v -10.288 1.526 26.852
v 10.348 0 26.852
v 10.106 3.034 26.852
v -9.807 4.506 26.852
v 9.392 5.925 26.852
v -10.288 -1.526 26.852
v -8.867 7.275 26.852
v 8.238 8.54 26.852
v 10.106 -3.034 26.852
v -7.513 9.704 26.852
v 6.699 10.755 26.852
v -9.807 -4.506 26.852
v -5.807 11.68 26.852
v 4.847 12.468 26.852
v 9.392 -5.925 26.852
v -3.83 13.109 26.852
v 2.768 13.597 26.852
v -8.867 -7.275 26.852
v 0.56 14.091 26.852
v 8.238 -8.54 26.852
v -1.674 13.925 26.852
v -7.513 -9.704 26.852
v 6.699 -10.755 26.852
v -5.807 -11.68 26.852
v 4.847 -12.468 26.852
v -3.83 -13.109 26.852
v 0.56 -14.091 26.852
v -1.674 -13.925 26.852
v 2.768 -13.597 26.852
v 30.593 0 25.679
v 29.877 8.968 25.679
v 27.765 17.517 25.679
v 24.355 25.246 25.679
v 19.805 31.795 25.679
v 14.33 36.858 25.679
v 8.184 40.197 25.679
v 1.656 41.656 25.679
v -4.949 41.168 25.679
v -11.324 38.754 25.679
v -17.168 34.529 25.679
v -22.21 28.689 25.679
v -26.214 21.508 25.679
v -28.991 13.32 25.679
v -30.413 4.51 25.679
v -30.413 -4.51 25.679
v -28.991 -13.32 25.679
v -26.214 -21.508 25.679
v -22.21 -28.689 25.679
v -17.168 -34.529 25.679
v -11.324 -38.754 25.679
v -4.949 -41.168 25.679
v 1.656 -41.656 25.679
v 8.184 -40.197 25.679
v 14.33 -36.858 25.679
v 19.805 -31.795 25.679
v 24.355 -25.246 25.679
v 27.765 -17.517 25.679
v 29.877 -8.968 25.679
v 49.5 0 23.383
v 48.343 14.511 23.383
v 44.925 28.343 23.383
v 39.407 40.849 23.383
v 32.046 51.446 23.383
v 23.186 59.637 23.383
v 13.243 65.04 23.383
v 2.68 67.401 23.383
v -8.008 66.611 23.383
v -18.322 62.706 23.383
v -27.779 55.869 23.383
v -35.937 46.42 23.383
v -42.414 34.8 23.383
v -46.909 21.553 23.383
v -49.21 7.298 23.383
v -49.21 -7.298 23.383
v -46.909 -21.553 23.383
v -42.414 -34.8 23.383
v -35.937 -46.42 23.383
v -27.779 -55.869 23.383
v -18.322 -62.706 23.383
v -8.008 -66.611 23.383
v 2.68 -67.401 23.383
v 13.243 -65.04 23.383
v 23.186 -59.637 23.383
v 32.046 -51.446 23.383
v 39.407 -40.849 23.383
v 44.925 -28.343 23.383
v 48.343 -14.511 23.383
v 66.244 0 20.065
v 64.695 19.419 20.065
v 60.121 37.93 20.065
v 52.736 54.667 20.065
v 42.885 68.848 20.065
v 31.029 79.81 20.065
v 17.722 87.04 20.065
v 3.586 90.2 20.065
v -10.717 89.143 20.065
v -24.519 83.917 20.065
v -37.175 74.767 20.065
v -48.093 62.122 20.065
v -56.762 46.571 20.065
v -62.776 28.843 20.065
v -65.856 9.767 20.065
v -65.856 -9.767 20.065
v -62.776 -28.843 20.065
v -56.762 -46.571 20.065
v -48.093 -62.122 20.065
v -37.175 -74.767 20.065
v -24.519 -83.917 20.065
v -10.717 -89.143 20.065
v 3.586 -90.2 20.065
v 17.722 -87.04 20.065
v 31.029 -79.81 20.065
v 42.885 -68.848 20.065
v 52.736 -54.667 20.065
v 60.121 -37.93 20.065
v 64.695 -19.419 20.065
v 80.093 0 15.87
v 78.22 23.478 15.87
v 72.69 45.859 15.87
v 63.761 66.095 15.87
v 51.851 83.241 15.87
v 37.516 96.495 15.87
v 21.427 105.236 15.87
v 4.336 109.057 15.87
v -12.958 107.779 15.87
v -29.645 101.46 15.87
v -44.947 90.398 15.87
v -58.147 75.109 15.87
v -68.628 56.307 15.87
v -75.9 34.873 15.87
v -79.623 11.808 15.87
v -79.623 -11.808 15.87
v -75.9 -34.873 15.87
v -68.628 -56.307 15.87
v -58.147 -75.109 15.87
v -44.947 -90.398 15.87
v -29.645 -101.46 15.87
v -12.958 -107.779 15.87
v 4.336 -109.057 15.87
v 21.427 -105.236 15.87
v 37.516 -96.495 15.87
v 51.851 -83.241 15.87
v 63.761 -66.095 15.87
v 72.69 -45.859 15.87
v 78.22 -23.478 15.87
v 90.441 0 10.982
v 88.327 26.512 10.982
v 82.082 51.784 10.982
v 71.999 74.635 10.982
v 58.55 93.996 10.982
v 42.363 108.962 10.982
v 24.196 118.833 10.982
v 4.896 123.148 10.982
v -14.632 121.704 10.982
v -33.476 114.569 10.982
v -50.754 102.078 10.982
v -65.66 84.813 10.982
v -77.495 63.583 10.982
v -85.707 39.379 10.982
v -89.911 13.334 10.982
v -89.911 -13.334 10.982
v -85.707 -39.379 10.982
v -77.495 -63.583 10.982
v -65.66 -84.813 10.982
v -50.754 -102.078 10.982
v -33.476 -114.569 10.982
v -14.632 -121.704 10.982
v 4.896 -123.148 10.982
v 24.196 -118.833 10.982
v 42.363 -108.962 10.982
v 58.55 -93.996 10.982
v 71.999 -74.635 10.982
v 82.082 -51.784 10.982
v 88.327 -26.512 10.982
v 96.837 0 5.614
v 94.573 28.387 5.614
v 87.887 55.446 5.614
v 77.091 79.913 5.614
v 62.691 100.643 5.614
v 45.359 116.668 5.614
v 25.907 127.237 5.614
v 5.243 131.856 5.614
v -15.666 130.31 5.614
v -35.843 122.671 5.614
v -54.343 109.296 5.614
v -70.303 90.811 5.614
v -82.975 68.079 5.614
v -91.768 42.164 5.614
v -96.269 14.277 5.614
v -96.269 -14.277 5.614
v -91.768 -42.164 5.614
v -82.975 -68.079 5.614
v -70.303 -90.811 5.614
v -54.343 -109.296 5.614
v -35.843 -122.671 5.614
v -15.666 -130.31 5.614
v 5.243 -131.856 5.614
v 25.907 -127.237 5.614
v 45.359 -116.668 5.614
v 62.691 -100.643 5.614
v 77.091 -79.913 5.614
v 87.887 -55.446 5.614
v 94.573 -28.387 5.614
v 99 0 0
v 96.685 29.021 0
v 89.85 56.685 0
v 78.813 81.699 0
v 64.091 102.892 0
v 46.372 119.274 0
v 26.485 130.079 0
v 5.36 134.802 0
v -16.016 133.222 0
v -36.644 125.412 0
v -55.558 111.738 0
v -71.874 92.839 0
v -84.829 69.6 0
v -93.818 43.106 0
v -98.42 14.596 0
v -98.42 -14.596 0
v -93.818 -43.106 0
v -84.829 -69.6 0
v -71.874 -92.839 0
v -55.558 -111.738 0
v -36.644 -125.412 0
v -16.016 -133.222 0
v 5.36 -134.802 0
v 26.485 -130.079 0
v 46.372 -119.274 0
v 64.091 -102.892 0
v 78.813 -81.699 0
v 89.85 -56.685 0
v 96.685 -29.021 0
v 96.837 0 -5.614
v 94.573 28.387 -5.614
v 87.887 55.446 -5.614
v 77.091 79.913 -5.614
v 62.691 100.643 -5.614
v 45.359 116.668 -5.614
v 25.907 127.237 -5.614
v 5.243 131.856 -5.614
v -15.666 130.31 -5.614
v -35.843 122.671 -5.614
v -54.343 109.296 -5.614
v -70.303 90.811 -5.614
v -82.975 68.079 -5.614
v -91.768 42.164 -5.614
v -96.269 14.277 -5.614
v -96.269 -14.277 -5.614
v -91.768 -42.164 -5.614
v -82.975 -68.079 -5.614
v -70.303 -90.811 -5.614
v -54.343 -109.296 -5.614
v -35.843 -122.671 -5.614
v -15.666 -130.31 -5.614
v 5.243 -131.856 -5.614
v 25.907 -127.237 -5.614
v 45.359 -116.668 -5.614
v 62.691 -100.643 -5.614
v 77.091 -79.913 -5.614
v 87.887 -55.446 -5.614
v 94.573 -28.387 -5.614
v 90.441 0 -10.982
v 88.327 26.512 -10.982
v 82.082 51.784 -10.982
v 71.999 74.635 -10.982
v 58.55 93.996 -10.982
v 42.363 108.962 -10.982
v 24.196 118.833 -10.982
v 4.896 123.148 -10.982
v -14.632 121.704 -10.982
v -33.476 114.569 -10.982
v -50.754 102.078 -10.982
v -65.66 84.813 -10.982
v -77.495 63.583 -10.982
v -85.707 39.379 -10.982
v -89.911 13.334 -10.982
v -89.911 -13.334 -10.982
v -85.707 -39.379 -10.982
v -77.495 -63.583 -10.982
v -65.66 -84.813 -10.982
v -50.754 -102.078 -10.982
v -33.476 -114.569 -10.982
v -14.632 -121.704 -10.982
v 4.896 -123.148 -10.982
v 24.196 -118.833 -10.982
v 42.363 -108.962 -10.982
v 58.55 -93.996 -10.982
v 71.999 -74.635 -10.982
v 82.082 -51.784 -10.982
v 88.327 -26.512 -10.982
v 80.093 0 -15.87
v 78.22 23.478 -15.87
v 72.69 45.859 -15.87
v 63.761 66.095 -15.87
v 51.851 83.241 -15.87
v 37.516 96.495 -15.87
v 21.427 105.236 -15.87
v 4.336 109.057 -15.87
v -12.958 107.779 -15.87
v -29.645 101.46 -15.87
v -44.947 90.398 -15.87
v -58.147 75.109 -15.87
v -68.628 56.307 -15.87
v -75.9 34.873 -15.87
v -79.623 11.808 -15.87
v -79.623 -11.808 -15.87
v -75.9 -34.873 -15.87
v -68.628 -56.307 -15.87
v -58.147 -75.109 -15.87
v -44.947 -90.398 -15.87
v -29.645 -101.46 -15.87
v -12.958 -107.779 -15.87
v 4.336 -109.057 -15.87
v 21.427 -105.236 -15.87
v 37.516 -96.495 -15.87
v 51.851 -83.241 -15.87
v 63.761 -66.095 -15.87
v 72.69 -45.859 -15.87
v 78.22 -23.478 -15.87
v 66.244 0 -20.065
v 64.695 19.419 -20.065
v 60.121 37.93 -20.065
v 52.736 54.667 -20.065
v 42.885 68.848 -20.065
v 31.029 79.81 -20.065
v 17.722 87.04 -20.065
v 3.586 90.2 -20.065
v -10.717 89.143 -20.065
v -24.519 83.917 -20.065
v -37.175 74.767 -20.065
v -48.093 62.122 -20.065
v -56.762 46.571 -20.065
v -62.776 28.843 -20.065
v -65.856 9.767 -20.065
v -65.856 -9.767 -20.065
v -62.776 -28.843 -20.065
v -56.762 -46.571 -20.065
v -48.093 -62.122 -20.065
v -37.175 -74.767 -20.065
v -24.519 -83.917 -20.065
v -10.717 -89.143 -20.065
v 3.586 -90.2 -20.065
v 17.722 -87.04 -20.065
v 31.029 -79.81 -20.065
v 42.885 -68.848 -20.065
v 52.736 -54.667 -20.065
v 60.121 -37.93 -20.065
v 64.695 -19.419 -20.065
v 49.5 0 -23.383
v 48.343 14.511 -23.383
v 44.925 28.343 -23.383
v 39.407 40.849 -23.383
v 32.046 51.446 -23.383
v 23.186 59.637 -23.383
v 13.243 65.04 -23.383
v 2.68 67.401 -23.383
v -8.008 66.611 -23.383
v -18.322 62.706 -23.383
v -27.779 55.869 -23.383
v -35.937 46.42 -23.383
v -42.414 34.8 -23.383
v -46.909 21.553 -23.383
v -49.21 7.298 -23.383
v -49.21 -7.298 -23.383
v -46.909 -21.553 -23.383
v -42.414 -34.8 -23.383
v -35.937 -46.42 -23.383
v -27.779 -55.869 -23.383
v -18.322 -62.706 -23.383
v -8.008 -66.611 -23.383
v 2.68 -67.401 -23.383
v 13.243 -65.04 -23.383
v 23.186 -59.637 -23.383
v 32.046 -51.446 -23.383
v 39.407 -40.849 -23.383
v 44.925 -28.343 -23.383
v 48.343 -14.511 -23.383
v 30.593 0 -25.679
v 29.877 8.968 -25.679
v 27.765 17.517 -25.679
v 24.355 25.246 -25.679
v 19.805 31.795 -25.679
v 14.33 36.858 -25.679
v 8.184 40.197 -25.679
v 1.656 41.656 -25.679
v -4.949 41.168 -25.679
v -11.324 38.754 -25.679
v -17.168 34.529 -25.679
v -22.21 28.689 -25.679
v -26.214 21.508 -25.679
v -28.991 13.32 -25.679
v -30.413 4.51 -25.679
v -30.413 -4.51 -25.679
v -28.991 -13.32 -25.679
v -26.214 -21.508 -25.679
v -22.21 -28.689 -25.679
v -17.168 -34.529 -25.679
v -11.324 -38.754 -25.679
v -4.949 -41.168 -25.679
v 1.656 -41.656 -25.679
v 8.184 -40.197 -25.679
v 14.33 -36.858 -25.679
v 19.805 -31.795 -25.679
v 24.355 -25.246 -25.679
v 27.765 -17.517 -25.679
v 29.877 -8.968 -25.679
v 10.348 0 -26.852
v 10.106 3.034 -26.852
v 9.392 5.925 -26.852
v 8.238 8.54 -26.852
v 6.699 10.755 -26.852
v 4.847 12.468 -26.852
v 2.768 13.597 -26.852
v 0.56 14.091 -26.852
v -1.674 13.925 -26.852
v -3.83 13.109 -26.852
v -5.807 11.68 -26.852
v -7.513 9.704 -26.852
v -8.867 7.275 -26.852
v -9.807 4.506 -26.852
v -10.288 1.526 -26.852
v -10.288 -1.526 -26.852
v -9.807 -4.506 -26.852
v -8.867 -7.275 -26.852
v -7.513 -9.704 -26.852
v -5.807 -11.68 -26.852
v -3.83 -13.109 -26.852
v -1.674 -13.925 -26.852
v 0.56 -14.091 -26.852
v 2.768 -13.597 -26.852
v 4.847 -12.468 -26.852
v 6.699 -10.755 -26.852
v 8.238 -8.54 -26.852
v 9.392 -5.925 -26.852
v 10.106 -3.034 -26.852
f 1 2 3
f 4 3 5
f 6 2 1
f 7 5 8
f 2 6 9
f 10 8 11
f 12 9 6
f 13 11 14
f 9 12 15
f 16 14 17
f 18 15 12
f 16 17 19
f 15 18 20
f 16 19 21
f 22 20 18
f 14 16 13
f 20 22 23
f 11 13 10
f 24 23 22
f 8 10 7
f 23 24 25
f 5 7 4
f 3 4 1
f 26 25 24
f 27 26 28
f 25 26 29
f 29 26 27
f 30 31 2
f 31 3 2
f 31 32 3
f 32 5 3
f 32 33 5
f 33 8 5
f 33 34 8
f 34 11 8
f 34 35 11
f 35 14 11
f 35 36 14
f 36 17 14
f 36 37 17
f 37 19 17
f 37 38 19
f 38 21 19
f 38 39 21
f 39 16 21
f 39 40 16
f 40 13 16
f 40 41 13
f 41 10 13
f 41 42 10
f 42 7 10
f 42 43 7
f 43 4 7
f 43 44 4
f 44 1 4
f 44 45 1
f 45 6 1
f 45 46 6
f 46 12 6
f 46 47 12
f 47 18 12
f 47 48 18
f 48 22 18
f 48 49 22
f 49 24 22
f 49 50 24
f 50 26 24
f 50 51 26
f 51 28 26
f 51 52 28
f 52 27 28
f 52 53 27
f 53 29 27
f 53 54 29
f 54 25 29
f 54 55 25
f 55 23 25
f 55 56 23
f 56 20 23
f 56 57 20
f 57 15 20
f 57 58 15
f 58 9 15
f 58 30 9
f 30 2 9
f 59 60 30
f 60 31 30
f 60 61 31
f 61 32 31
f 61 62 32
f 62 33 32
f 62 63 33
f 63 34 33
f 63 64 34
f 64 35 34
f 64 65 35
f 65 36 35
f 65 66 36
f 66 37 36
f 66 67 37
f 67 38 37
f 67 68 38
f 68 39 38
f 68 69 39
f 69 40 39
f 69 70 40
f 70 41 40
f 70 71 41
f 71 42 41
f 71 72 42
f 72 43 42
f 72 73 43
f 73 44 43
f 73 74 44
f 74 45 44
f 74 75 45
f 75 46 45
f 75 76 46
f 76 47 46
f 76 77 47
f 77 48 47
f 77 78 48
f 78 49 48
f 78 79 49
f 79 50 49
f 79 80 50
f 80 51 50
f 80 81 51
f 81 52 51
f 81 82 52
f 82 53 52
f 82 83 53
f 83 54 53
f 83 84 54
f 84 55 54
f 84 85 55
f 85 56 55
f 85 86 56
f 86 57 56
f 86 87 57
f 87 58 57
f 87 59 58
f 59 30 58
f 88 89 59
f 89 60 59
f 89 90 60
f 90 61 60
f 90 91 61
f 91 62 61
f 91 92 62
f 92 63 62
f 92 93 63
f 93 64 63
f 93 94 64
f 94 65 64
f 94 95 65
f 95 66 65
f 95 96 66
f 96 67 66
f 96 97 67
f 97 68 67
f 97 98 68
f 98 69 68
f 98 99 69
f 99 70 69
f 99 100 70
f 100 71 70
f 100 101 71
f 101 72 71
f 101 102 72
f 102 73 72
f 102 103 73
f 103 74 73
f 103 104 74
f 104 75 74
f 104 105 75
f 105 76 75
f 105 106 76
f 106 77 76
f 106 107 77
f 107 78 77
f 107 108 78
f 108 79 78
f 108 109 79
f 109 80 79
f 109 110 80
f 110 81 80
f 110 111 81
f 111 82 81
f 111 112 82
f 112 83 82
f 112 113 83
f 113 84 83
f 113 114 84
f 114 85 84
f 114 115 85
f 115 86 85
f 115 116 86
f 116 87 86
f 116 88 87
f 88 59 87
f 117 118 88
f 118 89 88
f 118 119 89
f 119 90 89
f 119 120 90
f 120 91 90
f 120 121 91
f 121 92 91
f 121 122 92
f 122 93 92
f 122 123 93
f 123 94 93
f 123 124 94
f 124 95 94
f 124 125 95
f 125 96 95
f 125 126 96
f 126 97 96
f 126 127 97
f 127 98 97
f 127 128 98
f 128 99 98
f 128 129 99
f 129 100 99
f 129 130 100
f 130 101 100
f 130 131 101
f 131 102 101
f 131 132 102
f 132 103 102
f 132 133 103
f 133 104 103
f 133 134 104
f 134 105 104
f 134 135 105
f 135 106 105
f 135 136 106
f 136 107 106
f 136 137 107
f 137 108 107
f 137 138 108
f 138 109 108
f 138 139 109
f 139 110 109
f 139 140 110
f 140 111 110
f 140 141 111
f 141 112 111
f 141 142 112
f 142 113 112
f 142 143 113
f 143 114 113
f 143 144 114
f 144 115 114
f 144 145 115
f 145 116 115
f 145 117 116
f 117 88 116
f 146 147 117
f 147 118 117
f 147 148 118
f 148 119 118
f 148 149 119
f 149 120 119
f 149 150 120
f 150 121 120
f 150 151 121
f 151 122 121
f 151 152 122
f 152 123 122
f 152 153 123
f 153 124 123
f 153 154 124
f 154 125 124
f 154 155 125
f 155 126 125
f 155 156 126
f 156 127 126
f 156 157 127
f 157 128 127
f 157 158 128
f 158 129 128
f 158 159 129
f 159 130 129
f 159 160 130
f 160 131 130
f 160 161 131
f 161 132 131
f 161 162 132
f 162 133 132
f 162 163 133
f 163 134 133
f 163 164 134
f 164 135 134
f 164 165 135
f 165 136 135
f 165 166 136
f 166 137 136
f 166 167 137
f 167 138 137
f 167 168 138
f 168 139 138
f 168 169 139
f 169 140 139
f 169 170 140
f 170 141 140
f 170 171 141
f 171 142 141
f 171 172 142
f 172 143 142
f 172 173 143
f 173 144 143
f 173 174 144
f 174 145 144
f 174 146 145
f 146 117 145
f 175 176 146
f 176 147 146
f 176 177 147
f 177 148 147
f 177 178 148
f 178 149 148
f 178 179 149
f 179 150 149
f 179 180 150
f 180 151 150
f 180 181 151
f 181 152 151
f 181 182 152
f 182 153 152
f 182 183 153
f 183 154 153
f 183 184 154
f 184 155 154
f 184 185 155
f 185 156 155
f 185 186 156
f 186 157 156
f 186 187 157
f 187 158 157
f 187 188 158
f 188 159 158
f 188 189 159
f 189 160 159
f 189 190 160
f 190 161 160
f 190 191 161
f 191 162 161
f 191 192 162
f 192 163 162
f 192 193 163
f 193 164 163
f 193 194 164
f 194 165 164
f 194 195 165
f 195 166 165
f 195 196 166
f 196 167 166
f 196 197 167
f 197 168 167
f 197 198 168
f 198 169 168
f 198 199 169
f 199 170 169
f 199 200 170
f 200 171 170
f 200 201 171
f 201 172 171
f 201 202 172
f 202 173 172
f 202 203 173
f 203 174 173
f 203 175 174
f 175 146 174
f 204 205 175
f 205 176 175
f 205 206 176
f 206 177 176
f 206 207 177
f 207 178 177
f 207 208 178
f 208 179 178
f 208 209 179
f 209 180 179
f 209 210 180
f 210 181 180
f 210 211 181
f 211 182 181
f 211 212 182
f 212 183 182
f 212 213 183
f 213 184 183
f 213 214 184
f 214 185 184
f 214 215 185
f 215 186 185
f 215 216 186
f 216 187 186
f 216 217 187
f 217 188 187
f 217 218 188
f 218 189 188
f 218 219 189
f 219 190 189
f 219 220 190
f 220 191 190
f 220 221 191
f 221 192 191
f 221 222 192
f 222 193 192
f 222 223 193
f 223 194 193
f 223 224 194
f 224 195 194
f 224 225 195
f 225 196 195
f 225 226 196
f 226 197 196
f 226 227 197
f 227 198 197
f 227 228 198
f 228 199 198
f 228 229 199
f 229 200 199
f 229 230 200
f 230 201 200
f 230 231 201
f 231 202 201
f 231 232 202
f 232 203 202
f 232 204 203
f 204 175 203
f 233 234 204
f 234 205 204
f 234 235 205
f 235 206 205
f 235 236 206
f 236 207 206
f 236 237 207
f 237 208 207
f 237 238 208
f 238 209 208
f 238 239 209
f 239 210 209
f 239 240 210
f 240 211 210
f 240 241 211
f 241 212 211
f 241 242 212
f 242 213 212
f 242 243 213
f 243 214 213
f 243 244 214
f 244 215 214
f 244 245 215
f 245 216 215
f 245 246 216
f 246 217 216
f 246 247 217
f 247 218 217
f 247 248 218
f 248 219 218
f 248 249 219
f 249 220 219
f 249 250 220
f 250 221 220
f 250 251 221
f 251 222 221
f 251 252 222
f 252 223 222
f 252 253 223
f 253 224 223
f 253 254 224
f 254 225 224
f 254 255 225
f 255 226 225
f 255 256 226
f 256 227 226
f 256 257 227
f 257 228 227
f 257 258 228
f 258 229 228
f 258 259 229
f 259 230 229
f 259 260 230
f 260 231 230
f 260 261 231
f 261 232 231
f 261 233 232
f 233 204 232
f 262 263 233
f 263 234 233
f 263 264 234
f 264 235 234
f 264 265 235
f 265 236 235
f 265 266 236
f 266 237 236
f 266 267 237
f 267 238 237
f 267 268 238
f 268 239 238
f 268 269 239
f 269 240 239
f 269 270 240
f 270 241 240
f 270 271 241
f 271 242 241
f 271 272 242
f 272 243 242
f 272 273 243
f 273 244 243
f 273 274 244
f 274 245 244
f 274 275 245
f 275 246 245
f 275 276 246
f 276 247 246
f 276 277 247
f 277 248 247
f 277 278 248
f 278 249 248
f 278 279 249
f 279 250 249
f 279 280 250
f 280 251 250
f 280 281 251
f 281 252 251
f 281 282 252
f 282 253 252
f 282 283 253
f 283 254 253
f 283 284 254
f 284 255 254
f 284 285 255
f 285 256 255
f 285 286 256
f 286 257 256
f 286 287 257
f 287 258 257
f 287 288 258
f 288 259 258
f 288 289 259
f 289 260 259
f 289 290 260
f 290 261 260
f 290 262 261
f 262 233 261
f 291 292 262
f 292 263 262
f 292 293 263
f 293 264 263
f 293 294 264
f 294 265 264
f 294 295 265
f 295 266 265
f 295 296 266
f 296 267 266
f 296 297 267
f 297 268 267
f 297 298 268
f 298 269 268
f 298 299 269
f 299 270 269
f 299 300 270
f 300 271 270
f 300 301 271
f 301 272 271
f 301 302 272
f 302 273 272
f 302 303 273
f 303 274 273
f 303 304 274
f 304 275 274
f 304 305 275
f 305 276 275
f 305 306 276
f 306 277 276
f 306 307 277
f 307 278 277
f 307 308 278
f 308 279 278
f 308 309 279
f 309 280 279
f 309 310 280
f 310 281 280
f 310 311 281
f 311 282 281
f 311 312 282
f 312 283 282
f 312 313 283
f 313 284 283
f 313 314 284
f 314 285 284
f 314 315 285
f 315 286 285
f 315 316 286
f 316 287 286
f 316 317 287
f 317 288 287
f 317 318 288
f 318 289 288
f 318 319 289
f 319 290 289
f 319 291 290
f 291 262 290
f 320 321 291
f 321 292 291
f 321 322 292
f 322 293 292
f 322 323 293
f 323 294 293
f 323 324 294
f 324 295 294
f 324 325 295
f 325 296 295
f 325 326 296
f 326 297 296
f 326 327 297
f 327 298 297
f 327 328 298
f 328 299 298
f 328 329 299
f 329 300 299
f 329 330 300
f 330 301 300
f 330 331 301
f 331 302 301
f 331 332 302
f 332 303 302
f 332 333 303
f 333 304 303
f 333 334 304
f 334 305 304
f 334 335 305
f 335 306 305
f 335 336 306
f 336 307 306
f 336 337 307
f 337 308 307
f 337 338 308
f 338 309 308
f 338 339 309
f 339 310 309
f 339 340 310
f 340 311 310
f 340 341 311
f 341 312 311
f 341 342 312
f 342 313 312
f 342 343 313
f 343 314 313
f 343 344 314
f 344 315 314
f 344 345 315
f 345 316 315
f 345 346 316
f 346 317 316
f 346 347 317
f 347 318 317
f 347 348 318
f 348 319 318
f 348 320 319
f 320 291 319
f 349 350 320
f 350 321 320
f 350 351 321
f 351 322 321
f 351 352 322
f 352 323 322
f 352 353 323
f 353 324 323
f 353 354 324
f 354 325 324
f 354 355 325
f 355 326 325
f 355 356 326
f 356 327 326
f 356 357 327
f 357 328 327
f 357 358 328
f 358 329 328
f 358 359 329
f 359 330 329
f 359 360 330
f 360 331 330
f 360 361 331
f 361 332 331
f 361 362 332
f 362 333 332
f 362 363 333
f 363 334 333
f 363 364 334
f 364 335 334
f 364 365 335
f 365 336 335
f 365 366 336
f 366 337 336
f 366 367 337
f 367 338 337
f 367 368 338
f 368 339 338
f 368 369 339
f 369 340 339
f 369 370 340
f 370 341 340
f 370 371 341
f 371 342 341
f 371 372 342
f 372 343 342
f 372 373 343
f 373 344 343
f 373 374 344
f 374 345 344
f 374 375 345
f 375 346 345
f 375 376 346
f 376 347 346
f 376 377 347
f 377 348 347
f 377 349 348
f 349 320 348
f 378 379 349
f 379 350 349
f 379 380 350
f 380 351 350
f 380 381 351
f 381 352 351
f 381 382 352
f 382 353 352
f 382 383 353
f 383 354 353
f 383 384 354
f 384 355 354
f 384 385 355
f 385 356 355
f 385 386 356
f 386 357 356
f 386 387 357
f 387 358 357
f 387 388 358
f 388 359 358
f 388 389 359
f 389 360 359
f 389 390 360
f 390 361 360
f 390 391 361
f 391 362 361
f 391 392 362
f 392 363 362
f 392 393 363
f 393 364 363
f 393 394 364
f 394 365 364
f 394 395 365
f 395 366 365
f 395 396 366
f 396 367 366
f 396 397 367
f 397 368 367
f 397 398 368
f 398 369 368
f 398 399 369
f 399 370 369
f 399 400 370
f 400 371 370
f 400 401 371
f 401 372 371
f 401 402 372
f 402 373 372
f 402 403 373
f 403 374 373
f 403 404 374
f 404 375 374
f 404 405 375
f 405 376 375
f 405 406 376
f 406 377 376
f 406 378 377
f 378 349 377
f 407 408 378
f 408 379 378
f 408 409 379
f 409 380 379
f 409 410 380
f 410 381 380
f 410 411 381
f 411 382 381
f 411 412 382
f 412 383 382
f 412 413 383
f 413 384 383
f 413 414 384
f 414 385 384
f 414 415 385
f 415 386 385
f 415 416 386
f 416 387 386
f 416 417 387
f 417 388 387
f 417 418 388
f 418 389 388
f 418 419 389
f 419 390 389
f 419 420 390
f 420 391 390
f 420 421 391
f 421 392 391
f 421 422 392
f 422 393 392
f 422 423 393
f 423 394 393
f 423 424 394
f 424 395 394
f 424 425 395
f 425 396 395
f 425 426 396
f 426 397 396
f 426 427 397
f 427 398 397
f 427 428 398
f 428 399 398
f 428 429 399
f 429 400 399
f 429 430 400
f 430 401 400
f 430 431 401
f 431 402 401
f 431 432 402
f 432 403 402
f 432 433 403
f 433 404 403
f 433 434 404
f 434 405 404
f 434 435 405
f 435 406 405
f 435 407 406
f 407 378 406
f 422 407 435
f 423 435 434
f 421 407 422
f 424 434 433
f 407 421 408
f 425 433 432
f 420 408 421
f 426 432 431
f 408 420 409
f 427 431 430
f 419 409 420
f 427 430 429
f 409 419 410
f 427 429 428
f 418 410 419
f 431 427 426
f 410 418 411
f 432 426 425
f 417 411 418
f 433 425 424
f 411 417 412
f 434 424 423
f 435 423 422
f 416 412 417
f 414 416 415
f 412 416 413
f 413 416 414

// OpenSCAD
// Generated by SolidPython 1.0.1 on 2020-07-29 00:46:50


scale(v = [11, 15, 3]) {
	sphere(r = 9);
}
/***********************************************
*********      SolidPython code:      **********
************************************************
 
# import packages: SolidPython
from solid import *
from solid.utils import *
from itertools import chain, combinations, permutations


class Resize:

    def __init__(self, scad_file):
        self.scad_file = scad_file
        #self.scad_file = import_scad(scad_file)
        # cone/cylinder param:
        self.r1 = 0
        self.r2 = 0
        self.h = 0
        # rectangular prism param:
        self.w = 0
        self.l = 0
        # ellipse param:
        self.r = 0

    # import OpenScad code (file name corresponds to shape)


    # classify shape + parameters
    def assign(self, param1, param2, param3):
        if self.scad_file == 'cone.scad':
            self.r1 = param1
            self.r2 = param2
            self.h = param3
        elif self.scad_file == 'cylinder.scad':
            self.r1 = param1
            self.r2 = param2
            self.h = param3
        elif self.scad_file == 'rectangularPrism.scad':
            self.h = param1
            self.l = param2
            self.w = param3
        else:
            self.r = param1
            self.h = param2

    # resize parameters
    def iterate(self):
        x = range(3, 20, 2)
        i = 1
        if self.scad_file == 'cone.scad':
            tempList = list(permutations(x, 2))
            for temp in tempList:
                param1 = temp[0]
                param2 = temp[1]
                filepath = 'produced_scad_files/' + 'cone' + str(param1) + '_' + str(param2) + '_' + '.scad'
                scad_render_to_file(cylinder(h=param1, r1=param2, r2=0), filepath)

        elif self.scad_file == 'cylinder.scad':
            tempList = list(permutations(x, 3))
            for temp in tempList:
                param1 = temp[0]
                param2 = temp[1]
                filepath = 'produced_scad_files/' + 'cylinder' + str(param1) + '_' + str(param2) + '_' + '.scad'
                scad_render_to_file(cylinder(h=param1, r1=param2, r2=param2), filepath)

        elif self.scad_file == 'rectangularPrism.scad':
            tempList = list(permutations(x, 3))
            for temp in tempList:
                param1 = temp[0]
                param2 = temp[1]
                param3 = temp[2]
                filepath = 'produced_scad_files/' + 'rectangularPrism' + str(param1) + '_' + str(param2) + '_' + str(
                    param3) + '.scad'
                scad_render_to_file(cube(size=(param1, param2, param3)), filepath)

        elif self.scad_file == 'ellipse.scad':
            tempList = list(permutations(x, 4))
            for temp in tempList:
                param1 = temp[0]
                param2 = temp[1]
                param3 = temp[2]
                param4 = temp[3]
                filepath = 'produced_scad_files/' + 'ellipse' + str(param1) + '_' + str(param2) + '_' + str(param3) + '_' + str(param4) + '.scad'
                scad_render_to_file(scale([param1, param2, param3])(sphere(r=param4)), filepath)

    def render_to_scadfile(self):
        scad_render_to_file(scad, 'example.scad') 
 
************************************************/
